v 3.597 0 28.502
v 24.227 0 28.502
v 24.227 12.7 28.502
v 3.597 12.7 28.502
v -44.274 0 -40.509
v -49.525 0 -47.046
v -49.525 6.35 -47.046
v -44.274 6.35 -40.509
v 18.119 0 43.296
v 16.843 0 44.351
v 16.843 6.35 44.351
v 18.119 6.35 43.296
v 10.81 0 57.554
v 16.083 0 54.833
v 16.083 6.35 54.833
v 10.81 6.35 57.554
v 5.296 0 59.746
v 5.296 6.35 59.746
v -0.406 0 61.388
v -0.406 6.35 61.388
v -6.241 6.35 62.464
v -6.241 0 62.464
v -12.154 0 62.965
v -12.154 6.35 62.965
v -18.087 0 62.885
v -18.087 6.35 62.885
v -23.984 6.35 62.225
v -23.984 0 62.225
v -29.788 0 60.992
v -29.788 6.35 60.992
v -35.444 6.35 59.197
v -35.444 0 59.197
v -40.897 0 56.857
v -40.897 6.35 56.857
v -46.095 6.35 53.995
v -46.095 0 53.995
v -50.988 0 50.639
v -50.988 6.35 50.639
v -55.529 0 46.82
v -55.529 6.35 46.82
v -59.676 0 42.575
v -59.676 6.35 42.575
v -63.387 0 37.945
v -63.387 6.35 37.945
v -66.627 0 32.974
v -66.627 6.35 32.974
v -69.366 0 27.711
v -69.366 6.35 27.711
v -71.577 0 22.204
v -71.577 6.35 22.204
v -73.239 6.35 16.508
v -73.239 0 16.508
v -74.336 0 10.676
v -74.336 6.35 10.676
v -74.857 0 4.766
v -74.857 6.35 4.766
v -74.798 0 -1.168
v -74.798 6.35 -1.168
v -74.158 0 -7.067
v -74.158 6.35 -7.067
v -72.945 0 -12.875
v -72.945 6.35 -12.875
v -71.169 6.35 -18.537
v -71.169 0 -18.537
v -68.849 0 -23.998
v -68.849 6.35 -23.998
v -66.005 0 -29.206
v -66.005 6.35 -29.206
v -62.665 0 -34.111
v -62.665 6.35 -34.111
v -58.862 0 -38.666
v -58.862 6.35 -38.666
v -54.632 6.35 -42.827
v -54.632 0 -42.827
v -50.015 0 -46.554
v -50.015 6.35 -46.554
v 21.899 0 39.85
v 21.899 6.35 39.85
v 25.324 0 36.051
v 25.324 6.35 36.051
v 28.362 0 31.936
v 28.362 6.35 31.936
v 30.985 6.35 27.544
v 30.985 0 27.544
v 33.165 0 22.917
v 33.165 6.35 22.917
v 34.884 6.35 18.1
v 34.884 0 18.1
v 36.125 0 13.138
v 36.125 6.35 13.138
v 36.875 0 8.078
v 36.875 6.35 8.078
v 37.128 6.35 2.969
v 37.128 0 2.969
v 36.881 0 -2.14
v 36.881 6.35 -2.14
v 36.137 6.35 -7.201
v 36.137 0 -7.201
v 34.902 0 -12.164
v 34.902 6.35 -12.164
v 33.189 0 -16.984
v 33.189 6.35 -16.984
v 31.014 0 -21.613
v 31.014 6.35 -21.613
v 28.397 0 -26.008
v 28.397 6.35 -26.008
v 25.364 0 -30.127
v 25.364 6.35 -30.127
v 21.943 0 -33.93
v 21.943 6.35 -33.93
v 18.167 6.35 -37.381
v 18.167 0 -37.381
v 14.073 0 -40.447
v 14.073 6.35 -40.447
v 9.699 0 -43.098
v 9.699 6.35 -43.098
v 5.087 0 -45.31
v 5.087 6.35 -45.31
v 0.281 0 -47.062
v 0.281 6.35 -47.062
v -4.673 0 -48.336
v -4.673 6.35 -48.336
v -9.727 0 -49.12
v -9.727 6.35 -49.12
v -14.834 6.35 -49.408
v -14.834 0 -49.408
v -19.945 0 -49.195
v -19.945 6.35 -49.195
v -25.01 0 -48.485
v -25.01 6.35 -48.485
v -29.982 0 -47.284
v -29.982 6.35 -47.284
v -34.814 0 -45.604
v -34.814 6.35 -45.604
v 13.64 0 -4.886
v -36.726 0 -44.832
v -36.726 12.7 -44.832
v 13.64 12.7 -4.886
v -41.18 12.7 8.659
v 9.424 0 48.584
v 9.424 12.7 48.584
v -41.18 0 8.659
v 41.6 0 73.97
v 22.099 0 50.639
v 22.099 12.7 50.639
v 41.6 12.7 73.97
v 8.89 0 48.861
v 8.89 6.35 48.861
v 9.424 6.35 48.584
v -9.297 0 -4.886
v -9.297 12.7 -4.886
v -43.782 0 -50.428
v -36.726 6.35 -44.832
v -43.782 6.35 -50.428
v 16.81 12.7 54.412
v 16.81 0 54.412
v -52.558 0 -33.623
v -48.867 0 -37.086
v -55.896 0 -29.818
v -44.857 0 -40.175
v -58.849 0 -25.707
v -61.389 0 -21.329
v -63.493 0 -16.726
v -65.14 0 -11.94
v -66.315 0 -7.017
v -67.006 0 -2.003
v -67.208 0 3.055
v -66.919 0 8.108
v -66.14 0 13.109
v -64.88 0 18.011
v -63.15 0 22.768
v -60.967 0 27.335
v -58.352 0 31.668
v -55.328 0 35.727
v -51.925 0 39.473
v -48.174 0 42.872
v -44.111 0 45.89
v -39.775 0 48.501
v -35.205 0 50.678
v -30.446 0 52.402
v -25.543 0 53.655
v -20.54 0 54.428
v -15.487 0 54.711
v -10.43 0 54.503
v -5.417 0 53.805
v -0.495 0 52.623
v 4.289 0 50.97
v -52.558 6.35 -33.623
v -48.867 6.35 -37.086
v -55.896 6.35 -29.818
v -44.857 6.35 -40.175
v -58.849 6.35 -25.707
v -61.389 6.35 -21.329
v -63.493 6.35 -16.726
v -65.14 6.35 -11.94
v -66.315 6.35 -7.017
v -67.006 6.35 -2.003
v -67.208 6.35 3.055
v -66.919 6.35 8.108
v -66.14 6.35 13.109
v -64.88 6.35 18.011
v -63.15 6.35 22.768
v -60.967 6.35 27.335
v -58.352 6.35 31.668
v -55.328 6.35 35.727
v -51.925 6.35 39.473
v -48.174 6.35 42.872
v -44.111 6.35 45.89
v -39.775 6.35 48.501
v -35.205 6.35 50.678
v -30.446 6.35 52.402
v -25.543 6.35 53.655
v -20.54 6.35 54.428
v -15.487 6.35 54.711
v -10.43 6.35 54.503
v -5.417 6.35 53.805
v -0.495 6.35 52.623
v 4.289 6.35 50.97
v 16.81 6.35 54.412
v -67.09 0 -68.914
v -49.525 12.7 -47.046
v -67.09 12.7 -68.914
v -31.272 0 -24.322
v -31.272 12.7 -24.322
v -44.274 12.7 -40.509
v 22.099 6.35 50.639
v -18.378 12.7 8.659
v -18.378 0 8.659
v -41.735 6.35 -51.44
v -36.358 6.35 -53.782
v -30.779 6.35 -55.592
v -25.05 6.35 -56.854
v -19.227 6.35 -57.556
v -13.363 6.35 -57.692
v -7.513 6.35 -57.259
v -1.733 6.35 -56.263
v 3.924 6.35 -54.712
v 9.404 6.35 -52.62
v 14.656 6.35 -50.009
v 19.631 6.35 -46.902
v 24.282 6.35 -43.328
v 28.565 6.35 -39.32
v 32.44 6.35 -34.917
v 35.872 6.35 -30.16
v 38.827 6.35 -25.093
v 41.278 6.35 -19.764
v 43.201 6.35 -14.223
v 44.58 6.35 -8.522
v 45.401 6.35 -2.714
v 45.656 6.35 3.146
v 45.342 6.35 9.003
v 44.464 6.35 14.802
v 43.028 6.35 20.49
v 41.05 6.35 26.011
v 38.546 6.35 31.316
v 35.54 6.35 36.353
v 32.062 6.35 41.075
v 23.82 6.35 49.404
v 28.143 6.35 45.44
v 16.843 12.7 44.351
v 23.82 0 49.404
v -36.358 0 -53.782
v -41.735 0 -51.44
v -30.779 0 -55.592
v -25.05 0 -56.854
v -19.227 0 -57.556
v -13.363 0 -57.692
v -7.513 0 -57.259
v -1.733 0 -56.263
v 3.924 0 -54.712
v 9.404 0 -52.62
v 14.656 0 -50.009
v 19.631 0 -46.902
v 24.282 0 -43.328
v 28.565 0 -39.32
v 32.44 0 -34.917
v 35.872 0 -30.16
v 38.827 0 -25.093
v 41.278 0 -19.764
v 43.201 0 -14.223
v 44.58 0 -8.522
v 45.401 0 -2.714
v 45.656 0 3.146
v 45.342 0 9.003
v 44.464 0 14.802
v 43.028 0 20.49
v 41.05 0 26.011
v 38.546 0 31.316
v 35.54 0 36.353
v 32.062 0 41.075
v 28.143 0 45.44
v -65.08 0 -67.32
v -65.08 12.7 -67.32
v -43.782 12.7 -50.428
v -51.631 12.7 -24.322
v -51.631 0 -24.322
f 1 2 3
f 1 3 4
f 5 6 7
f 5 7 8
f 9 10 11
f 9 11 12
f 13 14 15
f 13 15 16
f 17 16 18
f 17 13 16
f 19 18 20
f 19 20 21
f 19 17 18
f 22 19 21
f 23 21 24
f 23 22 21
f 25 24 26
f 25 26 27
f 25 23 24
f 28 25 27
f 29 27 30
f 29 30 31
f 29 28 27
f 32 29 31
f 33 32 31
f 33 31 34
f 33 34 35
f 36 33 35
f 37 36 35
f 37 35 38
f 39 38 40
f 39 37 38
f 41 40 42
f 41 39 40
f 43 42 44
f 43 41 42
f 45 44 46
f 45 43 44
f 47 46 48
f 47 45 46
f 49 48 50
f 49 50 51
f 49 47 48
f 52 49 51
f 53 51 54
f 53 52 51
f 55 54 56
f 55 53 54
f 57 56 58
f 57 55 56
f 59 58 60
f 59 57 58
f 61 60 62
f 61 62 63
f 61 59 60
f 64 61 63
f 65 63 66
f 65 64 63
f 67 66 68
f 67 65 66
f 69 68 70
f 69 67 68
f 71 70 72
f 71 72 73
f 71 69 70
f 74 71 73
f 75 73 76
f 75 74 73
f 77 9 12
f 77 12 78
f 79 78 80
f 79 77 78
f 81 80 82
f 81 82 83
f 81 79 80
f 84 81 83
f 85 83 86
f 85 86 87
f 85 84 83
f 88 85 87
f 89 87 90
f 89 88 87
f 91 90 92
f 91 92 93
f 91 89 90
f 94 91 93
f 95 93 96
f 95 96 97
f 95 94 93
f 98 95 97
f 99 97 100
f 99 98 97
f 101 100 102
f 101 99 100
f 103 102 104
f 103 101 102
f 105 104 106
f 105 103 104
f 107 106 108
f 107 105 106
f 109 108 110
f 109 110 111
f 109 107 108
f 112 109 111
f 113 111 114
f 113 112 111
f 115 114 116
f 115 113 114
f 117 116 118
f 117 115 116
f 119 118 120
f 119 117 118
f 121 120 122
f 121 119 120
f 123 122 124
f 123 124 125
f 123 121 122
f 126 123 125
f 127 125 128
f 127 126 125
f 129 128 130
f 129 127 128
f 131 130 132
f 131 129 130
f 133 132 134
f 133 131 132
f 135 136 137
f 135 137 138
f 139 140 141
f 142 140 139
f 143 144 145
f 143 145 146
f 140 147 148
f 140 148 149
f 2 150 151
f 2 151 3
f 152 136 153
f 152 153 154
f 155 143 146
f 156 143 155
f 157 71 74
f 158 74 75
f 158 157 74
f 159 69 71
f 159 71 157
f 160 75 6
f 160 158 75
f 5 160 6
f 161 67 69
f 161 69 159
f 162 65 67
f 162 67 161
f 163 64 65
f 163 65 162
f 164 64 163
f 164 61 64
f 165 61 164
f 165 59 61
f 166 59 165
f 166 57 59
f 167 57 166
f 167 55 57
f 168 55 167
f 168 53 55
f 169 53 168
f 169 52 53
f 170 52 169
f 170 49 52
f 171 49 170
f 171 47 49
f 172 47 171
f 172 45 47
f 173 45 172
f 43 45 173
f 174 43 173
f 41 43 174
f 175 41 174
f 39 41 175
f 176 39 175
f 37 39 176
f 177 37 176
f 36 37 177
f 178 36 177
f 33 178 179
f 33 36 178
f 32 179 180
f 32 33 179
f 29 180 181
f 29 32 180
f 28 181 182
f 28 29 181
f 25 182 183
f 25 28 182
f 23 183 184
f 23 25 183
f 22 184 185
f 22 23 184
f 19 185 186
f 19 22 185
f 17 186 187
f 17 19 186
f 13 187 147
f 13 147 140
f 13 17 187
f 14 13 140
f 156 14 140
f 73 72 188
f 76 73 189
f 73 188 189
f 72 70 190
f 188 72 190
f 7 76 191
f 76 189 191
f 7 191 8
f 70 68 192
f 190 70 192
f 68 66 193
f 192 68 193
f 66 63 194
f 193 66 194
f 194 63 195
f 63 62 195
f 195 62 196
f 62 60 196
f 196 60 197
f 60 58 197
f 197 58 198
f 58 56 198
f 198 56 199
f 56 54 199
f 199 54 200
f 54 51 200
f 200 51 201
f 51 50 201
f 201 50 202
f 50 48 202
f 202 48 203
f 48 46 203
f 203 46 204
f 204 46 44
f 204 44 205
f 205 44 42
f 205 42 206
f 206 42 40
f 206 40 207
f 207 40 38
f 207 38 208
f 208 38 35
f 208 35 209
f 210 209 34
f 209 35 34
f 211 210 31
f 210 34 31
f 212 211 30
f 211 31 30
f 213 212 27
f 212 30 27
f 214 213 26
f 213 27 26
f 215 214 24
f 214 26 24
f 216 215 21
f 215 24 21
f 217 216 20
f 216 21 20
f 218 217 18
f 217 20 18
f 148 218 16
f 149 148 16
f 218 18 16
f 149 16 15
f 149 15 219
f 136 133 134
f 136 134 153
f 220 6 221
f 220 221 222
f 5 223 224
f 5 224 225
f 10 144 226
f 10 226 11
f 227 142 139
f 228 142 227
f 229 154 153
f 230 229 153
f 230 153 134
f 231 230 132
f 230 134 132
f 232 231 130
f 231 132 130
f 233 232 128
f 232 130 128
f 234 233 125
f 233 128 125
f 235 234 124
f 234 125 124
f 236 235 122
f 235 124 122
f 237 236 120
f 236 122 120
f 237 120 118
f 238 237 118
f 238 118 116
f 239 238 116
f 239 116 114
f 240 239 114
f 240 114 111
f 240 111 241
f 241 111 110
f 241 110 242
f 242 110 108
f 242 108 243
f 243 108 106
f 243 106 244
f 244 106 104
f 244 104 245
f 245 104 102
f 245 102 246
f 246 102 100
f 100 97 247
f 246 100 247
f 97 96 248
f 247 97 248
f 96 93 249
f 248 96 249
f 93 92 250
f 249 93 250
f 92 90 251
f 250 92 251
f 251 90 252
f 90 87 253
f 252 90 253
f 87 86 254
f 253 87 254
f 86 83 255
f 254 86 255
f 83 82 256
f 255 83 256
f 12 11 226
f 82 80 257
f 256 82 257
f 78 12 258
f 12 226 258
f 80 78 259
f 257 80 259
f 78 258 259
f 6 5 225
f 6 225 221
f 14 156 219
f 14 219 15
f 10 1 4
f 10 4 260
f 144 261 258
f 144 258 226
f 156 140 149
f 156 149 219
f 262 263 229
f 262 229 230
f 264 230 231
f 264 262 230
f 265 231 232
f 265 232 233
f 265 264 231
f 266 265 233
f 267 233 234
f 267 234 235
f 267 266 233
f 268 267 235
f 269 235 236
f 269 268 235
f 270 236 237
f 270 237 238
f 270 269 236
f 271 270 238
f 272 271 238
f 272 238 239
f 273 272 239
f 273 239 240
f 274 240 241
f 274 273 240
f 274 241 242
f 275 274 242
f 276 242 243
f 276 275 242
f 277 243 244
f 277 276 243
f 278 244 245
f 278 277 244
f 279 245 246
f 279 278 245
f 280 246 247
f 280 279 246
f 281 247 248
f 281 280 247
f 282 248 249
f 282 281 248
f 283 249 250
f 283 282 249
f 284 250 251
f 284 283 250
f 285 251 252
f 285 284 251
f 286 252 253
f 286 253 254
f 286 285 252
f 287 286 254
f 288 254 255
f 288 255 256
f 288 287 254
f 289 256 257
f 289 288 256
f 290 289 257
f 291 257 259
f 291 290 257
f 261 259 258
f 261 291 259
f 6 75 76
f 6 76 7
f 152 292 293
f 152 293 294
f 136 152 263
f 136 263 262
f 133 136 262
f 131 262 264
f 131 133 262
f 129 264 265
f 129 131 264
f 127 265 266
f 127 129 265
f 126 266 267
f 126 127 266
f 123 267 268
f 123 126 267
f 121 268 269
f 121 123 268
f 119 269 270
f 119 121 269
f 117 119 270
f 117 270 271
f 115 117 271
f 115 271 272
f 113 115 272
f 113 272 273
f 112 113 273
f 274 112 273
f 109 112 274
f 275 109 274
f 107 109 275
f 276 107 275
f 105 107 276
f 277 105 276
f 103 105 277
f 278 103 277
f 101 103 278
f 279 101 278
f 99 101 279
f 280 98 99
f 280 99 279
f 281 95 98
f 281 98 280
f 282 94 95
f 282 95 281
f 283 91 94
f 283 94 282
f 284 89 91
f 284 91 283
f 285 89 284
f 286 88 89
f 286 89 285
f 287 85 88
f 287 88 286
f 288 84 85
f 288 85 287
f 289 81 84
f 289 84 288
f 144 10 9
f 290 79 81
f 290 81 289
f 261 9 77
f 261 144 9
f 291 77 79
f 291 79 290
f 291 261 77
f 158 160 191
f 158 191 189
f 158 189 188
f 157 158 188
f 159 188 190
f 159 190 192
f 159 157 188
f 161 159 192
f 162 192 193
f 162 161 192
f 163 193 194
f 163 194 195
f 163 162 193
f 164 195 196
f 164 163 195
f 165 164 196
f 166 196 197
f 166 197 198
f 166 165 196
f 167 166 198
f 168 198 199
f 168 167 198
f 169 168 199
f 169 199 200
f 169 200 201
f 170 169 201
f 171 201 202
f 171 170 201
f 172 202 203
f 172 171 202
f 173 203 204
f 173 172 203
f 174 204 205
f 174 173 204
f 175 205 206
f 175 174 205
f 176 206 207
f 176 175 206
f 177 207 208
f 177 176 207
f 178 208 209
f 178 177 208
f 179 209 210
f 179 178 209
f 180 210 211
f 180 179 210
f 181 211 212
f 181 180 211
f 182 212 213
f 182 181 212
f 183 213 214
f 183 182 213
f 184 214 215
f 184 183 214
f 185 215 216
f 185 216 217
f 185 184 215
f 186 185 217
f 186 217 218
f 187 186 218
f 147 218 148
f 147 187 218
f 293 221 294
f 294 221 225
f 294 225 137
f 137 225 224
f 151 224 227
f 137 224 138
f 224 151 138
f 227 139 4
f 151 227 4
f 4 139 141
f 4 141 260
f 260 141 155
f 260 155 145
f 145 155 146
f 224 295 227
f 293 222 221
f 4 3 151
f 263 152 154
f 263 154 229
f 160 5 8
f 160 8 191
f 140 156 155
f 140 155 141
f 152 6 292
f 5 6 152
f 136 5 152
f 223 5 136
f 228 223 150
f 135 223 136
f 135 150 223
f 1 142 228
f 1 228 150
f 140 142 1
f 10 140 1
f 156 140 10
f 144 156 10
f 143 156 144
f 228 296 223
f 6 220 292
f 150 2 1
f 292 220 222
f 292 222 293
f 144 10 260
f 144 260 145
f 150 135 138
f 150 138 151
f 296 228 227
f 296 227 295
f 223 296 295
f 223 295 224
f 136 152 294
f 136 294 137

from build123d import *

# Parameters (mm, degrees)
F1_DEPTH = 6.35
F2_DEPTH = 12.7


with BuildPart() as f1:
    # F0 (on Front) → F1 (new body)
    with BuildSketch(Plane.XZ):
        with BuildLine():
            Line((23.819773, 49.403969), (22.099195, 50.639186))
            Line((22.099195, 50.639186), (16.843062, 44.350598))
            Line((16.843062, 44.350598), (18.119313, 43.296337))
            ThreePointArc((18.119313, 43.296337), (29.758985, -23.842782), (-34.813512, -45.603663))
            Line((-34.813512, -45.603663), (-36.725838, -44.83173))
            Line((-36.725838, -44.83173), (-43.782095, -50.428072))
            Line((-43.782095, -50.428072), (-41.735496, -51.439852))
            ThreePointArc((-41.735496, -51.439852), (35.871715, -30.160182), (23.819773, 49.403969))
        make_face()
        with BuildLine():
            ThreePointArc((-44.857178, -40.174656), (-59.712169, 29.533021), (8.89, 48.861068))
            Line((8.89, 48.861068), (9.423844, 48.584196))
            Line((9.423844, 48.584196), (16.810112, 54.411785))
            Line((16.810112, 54.411785), (16.083434, 54.83298))
            ThreePointArc((16.083434, 54.83298), (-65.067911, 35.499459), (-50.014734, -46.553742))
            Line((-50.014734, -46.553742), (-49.524635, -47.045834))
            Line((-49.524635, -47.045834), (-44.273766, -40.508794))
            Line((-44.273766, -40.508794), (-44.857178, -40.174656))
        make_face()
    extrude(amount=-F1_DEPTH)


with BuildPart() as f2:
    # F0 (on Front) → F2 (new body)
    with BuildSketch(Plane.XZ):
        Polygon((16.810112, 54.411785), (9.423844, 48.584196), (-41.179683, 8.65922), (-14.183283, 19.272977), (41.599773, 73.970236), align=None)
        Polygon((41.599773, 73.970236), (-14.183283, 19.272977), (3.596717, 28.502291), (16.843062, 44.350598), (22.099195, 50.639186), align=None)
        Polygon((3.596717, 28.502291), (-14.183283, 19.272977), (2.375191, 19.272977), (24.226947, 28.502291), align=None)
        Polygon((-14.183283, 19.272977), (-41.179683, 8.65922), (-18.377852, 8.65922), (2.375191, 19.272977), align=None)
        Polygon((2.375191, 19.272977), (-18.377852, 8.65922), (-51.630523, -24.322001), (-29.24878, -14.251146), align=None)
        Polygon((24.226947, 28.502291), (2.375191, 19.272977), (-29.24878, -14.251146), (-9.297175, -4.886107), align=None)
        Polygon((-51.630523, -24.322001), (-31.271745, -24.322001), (-13.097481, -14.251146), (-29.24878, -14.251146), align=None)
        Polygon((-31.271745, -24.322001), (-44.273766, -40.508794), (-49.524635, -47.045834), (-67.089812, -68.913503), (-13.097481, -14.251146), align=None)
        Polygon((-13.097481, -14.251146), (-67.089812, -68.913503), (-65.080233, -67.319699), (-43.782095, -50.428072), (-36.725838, -44.83173), (13.640382, -4.886107), align=None)
        Polygon((-29.24878, -14.251146), (-13.097481, -14.251146), (13.640382, -4.886107), (-9.297175, -4.886107), align=None)
    extrude(amount=-F2_DEPTH)


solid = Compound([f1.part, f2.part])
